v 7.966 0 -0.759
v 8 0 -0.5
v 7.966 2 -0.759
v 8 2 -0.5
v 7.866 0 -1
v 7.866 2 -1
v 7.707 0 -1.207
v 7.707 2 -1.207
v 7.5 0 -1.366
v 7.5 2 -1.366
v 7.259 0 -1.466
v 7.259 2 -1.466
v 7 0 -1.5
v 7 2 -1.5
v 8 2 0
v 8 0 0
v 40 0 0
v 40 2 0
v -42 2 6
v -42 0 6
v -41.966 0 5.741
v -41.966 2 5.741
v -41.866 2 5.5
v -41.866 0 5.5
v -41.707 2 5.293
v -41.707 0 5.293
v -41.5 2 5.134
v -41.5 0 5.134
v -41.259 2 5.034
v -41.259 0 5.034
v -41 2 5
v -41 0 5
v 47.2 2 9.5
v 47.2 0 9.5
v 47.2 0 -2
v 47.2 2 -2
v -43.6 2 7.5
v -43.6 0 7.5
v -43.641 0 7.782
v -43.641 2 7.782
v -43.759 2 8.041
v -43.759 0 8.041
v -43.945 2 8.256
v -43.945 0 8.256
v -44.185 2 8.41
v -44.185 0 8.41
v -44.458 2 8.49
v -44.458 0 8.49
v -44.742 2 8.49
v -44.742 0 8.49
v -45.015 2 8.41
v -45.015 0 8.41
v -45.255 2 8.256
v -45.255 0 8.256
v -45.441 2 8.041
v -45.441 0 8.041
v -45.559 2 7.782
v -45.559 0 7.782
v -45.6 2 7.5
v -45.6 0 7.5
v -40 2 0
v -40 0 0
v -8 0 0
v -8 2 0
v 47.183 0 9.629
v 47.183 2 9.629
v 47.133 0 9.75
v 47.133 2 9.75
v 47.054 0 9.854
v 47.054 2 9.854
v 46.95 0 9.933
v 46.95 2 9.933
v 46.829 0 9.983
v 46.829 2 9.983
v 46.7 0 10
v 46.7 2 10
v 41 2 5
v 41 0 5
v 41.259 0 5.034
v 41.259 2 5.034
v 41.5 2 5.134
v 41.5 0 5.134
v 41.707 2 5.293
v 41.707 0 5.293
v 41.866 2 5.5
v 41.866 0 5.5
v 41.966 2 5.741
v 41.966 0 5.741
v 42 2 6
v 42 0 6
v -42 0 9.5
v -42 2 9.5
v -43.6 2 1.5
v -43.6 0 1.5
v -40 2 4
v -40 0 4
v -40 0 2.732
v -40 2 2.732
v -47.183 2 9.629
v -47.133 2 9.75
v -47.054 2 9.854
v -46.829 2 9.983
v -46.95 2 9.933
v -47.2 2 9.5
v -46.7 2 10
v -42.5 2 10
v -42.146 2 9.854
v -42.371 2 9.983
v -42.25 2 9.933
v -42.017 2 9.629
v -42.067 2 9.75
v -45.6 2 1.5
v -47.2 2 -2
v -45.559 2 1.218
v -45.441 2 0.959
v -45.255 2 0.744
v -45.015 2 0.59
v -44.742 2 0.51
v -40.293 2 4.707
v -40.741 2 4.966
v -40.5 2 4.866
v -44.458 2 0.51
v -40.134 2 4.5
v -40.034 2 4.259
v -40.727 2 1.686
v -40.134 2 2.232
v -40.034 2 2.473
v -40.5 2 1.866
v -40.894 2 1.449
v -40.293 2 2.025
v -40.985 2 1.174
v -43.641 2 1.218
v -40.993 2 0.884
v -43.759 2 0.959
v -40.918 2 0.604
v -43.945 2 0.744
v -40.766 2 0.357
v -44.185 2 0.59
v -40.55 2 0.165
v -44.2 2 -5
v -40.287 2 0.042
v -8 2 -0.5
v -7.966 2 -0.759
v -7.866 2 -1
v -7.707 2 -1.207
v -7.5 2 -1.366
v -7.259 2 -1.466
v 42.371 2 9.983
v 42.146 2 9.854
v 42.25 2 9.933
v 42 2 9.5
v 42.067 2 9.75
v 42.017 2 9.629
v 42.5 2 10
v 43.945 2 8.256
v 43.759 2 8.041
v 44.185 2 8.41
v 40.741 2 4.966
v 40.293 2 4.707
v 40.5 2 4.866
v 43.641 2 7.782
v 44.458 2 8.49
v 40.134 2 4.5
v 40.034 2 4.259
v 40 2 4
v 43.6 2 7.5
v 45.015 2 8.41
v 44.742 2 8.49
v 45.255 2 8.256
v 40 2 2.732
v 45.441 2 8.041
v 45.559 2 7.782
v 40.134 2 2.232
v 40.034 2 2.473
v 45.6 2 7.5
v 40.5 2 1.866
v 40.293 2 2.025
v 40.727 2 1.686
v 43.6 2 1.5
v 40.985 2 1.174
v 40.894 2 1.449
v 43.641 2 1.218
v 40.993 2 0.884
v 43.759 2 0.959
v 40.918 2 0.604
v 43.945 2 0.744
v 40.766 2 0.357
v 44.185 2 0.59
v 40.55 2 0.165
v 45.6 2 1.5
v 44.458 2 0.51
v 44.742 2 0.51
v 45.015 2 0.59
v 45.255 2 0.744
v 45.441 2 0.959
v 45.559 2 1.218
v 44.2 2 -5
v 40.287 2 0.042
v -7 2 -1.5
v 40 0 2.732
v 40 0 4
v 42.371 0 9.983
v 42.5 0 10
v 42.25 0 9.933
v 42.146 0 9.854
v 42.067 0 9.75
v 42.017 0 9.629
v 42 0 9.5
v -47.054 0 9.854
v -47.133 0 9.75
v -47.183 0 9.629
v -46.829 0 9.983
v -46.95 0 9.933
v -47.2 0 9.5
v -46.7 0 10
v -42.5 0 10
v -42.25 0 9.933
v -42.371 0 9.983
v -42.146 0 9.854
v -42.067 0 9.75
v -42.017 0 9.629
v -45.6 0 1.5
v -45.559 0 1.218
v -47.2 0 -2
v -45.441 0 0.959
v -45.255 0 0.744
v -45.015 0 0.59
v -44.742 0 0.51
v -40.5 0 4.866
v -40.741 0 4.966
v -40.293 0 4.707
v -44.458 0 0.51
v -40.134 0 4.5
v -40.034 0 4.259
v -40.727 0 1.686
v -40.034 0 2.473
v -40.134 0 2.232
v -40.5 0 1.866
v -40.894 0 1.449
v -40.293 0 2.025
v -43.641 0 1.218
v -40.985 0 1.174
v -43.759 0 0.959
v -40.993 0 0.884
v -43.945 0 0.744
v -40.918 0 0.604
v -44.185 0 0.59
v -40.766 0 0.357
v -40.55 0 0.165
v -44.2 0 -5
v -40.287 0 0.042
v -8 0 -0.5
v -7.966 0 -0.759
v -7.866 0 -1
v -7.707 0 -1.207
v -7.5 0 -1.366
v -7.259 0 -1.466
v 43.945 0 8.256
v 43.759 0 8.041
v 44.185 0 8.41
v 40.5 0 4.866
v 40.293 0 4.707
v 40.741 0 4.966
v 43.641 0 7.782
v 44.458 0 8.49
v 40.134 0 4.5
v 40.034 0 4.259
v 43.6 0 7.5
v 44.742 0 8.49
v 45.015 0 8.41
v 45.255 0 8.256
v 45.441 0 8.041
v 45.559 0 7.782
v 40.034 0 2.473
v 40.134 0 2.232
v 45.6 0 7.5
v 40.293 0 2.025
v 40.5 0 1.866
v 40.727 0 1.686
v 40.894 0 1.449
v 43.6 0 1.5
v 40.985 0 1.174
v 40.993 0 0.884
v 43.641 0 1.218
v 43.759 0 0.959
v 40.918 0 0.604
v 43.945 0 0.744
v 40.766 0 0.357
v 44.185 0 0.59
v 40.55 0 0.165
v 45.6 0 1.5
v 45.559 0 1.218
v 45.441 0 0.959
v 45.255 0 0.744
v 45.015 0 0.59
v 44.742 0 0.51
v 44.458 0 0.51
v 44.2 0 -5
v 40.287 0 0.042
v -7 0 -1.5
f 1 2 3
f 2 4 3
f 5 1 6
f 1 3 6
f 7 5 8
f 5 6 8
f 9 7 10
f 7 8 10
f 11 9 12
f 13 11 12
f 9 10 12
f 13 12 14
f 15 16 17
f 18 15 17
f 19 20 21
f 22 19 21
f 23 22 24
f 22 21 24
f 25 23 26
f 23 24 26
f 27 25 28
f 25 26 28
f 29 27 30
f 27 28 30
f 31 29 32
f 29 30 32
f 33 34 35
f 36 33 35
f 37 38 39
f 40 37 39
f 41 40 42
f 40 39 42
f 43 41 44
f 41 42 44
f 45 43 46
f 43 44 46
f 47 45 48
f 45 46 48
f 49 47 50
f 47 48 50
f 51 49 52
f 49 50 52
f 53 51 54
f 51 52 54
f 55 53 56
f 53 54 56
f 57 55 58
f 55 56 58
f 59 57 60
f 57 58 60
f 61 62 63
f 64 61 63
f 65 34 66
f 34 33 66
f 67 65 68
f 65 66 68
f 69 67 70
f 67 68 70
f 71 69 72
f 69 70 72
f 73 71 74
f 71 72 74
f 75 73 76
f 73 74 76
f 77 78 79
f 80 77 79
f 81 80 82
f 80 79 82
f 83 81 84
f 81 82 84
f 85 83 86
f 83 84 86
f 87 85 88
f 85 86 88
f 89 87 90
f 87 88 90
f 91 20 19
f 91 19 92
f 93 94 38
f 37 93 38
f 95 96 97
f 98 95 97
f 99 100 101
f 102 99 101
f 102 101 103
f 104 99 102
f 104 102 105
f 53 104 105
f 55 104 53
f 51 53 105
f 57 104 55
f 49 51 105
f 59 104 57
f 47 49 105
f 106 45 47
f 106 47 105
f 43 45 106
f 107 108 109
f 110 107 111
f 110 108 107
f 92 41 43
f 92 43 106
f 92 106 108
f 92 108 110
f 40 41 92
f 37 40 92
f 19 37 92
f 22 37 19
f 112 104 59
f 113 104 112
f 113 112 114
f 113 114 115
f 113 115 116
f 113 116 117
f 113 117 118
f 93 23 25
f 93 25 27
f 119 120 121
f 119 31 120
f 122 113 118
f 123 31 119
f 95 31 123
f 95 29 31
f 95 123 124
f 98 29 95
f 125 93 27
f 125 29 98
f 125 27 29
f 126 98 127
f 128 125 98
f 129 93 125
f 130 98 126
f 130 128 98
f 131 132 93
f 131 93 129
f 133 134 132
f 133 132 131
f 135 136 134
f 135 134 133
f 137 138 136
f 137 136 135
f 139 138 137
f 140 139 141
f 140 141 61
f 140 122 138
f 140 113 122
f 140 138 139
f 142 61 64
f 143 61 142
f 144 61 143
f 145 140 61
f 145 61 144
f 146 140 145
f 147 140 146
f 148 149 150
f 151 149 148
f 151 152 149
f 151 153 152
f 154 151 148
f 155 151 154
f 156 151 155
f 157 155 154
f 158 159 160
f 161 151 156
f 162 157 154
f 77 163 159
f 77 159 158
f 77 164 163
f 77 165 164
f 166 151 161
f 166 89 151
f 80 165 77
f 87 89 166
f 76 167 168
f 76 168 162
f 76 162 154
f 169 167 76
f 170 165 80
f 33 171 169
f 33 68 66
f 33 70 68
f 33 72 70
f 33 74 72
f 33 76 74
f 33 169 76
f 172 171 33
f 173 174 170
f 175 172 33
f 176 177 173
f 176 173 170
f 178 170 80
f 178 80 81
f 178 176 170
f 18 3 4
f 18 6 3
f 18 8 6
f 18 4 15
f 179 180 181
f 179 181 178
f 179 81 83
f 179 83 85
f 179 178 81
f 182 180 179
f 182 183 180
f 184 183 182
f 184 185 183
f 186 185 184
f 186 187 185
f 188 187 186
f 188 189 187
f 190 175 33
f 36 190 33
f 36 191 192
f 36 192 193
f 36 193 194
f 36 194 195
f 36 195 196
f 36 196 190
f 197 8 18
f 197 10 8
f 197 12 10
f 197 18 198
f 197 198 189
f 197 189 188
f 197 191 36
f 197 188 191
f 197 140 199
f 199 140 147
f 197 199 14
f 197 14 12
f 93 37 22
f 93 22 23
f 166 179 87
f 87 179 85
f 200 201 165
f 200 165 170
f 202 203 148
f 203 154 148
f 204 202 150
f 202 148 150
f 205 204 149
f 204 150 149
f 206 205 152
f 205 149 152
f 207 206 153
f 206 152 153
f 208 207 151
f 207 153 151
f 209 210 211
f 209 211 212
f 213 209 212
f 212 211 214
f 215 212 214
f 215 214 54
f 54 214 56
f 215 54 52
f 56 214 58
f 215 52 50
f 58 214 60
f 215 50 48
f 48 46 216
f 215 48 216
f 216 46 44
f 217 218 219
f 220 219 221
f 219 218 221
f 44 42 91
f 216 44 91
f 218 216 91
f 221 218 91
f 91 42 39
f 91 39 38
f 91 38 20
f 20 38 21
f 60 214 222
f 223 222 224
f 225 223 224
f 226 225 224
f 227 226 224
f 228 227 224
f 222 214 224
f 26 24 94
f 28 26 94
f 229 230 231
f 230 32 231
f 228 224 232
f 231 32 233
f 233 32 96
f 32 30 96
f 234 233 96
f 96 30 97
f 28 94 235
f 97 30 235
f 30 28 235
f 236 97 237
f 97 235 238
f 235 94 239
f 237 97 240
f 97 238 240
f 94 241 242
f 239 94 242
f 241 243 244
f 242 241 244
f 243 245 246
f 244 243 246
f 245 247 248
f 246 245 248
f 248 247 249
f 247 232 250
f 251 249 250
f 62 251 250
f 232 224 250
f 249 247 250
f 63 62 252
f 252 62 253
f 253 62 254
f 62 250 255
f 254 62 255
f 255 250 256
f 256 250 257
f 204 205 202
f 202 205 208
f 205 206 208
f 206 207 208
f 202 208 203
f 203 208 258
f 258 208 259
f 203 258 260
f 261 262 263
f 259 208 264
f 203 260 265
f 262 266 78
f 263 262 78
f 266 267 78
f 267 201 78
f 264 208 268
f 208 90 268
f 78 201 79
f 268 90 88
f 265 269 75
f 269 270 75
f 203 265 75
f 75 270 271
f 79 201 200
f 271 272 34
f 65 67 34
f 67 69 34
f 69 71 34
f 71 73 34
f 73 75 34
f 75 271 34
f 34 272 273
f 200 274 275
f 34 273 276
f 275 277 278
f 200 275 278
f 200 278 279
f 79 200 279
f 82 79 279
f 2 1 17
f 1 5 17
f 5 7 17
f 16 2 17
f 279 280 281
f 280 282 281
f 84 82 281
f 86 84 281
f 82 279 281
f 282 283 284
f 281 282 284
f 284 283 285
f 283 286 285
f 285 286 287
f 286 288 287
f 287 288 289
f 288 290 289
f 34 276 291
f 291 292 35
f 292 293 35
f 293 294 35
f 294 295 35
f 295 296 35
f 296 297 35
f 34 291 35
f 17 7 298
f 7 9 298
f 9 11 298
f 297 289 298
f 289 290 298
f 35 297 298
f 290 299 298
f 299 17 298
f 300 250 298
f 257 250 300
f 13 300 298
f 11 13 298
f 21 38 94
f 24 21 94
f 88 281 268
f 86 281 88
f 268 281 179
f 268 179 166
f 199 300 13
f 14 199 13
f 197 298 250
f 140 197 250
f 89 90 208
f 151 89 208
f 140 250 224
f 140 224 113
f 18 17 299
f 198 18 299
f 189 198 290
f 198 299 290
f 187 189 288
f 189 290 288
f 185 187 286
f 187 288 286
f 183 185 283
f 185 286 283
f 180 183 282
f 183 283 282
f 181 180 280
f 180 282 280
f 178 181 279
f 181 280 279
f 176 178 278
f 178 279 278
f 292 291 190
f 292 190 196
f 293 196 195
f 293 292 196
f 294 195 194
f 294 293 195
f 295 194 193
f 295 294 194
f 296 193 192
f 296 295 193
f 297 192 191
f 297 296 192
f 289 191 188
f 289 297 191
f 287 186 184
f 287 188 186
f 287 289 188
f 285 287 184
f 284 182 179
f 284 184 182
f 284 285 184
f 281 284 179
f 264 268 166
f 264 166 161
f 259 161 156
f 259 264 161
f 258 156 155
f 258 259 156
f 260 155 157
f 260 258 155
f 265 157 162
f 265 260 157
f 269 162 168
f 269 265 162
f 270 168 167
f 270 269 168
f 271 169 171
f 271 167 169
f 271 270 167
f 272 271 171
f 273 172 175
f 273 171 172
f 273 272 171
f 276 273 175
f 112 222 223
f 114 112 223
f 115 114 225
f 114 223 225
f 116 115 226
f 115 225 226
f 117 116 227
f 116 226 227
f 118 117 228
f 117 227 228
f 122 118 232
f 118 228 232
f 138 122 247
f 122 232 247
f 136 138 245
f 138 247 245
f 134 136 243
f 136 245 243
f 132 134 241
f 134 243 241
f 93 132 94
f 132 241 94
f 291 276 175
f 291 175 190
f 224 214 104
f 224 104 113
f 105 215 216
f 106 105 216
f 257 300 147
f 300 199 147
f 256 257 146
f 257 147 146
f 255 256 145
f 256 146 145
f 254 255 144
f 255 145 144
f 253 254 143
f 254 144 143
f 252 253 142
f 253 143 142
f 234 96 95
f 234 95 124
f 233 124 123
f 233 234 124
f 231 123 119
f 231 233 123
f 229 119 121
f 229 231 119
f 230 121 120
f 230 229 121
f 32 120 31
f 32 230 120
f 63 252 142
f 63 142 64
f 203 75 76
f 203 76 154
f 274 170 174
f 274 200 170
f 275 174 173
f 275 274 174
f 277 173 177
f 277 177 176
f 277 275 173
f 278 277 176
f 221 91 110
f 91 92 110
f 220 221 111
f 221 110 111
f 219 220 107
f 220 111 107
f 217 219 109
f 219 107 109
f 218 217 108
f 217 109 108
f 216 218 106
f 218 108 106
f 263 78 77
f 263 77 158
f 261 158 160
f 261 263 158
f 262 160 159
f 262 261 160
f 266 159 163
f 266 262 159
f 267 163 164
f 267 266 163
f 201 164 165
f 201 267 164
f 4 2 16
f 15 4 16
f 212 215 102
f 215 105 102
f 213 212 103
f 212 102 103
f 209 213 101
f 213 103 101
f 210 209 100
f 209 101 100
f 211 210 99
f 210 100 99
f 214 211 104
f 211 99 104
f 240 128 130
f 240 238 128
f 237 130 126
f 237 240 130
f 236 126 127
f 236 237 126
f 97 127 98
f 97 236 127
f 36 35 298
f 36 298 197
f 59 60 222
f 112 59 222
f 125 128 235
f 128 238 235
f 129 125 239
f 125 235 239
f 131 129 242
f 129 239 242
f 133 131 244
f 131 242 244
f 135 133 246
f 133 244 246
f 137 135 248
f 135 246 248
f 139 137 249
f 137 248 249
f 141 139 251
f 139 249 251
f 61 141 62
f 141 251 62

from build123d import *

# Parameters (mm, degrees)
EXTRUDE_1_DEPTH     = 2
SKETCH_3_W          = 2
SKETCH_3_H          = 5
CUT_EXTRUDE_2_DEPTH = 10
CHAMFER_1_SIZE      = 3
SKETCH_4_W          = 16
SKETCH_4_H          = 3
CUT_EXTRUDE_3_DEPTH = 2
FILLET_1_R          = 1
FILLET_START        = -1
FILLET_2_DEPTH      = 4
FILLET_2_2_DEPTH    = 2
FILLET_3_R          = 0.5
CUT_EXTRUDE_4_DEPTH = 10
SKETCH_7_R          = 1
CUT_EXTRUDE_6_DEPTH = 10
FILLET_5_R          = 1


with BuildPart() as part:
    # 草图1 → 凸台-拉伸1 (new body)
    with BuildSketch(Plane(origin=(0, 0, 0), x_dir=(1, 0, 0), z_dir=(0, 1, 0))):
        Polygon((40, -10), (40, 0), (0, 0), (0, 5), (47.2, 5), (47.2, 0), (47.2, -10), align=None)
    extrude_1 = extrude(amount=EXTRUDE_1_DEPTH)

    # 草图3 → 切除-拉伸2 (cut)
    with BuildSketch(Plane.XZ):
        with Locations((41, 7.5)):
            Rectangle(SKETCH_3_W, SKETCH_3_H)
    cut_extrude_2 = extrude(amount=-CUT_EXTRUDE_2_DEPTH, mode=Mode.SUBTRACT)

    # 镜向1: 凸台-拉伸1, 切除-拉伸2 across plane
    add(extrude_1.mirror(Plane(origin=(0, 0, 0), x_dir=(0, 0, 1), z_dir=(1, 0, 0))))
    add(cut_extrude_2.mirror(Plane(origin=(0, 0, 0), x_dir=(0, 0, 1), z_dir=(1, 0, 0))), mode=Mode.SUBTRACT)

    # 倒角1
    chamfer_1_edges = [part.edges().sort_by_distance(p)[0] for p in [
        (47.2, 1, -5),
        (-47.2, 1, -5),
    ]]
    chamfer(chamfer_1_edges, length=CHAMFER_1_SIZE)

    # 草图4 → 切除-拉伸3 (cut)
    with BuildSketch(Plane.XZ):
        Rectangle(SKETCH_4_W, SKETCH_4_H)
    extrude(amount=-CUT_EXTRUDE_3_DEPTH, mode=Mode.SUBTRACT)

    # 圆角1
    fillet_1_edges = [part.edges().sort_by_distance(p)[0] for p in [
        (-8, 1, -1.5),
        (8, 1, -1.5),
    ]]
    fillet(fillet_1_edges, radius=FILLET_1_R)

    # 圆角2: read off the stored shape, not the designer's step
    # 圆角2 outline → 圆角2 (cut)
    with BuildSketch(Plane(origin=(0, 0, 0), x_dir=(1, 0, 0), z_dir=(0, 1, 0)).offset(FILLET_START)):
        with BuildLine():
            Line((-40, -5), (-40, -4))
            ThreePointArc((-40, -4), (-40.292893219, -4.707106781), (-41, -5))
            Line((-41, -5), (-40, -5))
        make_face()
        with BuildLine():
            Line((40, -5), (41, -5))
            ThreePointArc((41, -5), (40.292893219, -4.707106781), (40, -4))
            Line((40, -4), (40, -5))
        make_face()
    extrude(amount=FILLET_2_DEPTH, mode=Mode.SUBTRACT)

    # Fillet 2 2 outline → Fillet 2 2 (add)
    with BuildSketch(Plane(origin=(0, 0, 0), x_dir=(1, 0, 0), z_dir=(0, 1, 0))):
        with BuildLine():
            ThreePointArc((-42, -6), (-41.707106781, -5.292893219), (-41, -5))
            Line((-41, -5), (-42, -5))
            Line((-42, -5), (-42, -6))
        make_face()
        with BuildLine():
            ThreePointArc((41, -5), (41.707106781, -5.292893219), (42, -6))
            Line((42, -6), (42, -5))
            Line((42, -5), (41, -5))
        make_face()
    extrude(amount=FILLET_2_2_DEPTH)

    # 圆角3
    fillet_3_edges = [part.edges().sort_by_distance(p)[0] for p in [
        (47.2, 1, 10),
        (42, 1, 10),
        (-47.2, 1, 10),
        (-42, 1, 10),
    ]]
    fillet(fillet_3_edges, radius=FILLET_3_R)

    # 草图5 → 切除-拉伸4 (cut)
    with BuildSketch(Plane.XZ):
        with BuildLine():
            Line((43.6, 1.5), (43.6, 7.5))
            ThreePointArc((43.6, 7.5), (44.6, 8.5), (45.6, 7.5))
            Line((45.6, 7.5), (45.6, 1.5))
            ThreePointArc((45.6, 1.5), (44.6, 0.5), (43.6, 1.5))
        make_face()
    cut_extrude_4 = extrude(amount=-CUT_EXTRUDE_4_DEPTH, mode=Mode.SUBTRACT)

    # 镜向2: 切除-拉伸4 across plane
    add(cut_extrude_4.mirror(Plane(origin=(0, 0, 0), x_dir=(0, 0, 1), z_dir=(1, 0, 0))), mode=Mode.SUBTRACT)

    # 草图7 → 切除-拉伸6 (cut)
    with BuildSketch(Plane.XZ):
        with Locations((40, 1)):
            Circle(SKETCH_7_R)
        with Locations((-40, 1)):
            Circle(SKETCH_7_R)
    extrude(amount=-CUT_EXTRUDE_6_DEPTH, mode=Mode.SUBTRACT)

    # 圆角5
    fillet_5_edges = [part.edges().sort_by_distance(p)[0] for p in [
        (40, 1, 2),
        (-40, 1, 2),
    ]]
    fillet(fillet_5_edges, radius=FILLET_5_R)


solid = part.part
